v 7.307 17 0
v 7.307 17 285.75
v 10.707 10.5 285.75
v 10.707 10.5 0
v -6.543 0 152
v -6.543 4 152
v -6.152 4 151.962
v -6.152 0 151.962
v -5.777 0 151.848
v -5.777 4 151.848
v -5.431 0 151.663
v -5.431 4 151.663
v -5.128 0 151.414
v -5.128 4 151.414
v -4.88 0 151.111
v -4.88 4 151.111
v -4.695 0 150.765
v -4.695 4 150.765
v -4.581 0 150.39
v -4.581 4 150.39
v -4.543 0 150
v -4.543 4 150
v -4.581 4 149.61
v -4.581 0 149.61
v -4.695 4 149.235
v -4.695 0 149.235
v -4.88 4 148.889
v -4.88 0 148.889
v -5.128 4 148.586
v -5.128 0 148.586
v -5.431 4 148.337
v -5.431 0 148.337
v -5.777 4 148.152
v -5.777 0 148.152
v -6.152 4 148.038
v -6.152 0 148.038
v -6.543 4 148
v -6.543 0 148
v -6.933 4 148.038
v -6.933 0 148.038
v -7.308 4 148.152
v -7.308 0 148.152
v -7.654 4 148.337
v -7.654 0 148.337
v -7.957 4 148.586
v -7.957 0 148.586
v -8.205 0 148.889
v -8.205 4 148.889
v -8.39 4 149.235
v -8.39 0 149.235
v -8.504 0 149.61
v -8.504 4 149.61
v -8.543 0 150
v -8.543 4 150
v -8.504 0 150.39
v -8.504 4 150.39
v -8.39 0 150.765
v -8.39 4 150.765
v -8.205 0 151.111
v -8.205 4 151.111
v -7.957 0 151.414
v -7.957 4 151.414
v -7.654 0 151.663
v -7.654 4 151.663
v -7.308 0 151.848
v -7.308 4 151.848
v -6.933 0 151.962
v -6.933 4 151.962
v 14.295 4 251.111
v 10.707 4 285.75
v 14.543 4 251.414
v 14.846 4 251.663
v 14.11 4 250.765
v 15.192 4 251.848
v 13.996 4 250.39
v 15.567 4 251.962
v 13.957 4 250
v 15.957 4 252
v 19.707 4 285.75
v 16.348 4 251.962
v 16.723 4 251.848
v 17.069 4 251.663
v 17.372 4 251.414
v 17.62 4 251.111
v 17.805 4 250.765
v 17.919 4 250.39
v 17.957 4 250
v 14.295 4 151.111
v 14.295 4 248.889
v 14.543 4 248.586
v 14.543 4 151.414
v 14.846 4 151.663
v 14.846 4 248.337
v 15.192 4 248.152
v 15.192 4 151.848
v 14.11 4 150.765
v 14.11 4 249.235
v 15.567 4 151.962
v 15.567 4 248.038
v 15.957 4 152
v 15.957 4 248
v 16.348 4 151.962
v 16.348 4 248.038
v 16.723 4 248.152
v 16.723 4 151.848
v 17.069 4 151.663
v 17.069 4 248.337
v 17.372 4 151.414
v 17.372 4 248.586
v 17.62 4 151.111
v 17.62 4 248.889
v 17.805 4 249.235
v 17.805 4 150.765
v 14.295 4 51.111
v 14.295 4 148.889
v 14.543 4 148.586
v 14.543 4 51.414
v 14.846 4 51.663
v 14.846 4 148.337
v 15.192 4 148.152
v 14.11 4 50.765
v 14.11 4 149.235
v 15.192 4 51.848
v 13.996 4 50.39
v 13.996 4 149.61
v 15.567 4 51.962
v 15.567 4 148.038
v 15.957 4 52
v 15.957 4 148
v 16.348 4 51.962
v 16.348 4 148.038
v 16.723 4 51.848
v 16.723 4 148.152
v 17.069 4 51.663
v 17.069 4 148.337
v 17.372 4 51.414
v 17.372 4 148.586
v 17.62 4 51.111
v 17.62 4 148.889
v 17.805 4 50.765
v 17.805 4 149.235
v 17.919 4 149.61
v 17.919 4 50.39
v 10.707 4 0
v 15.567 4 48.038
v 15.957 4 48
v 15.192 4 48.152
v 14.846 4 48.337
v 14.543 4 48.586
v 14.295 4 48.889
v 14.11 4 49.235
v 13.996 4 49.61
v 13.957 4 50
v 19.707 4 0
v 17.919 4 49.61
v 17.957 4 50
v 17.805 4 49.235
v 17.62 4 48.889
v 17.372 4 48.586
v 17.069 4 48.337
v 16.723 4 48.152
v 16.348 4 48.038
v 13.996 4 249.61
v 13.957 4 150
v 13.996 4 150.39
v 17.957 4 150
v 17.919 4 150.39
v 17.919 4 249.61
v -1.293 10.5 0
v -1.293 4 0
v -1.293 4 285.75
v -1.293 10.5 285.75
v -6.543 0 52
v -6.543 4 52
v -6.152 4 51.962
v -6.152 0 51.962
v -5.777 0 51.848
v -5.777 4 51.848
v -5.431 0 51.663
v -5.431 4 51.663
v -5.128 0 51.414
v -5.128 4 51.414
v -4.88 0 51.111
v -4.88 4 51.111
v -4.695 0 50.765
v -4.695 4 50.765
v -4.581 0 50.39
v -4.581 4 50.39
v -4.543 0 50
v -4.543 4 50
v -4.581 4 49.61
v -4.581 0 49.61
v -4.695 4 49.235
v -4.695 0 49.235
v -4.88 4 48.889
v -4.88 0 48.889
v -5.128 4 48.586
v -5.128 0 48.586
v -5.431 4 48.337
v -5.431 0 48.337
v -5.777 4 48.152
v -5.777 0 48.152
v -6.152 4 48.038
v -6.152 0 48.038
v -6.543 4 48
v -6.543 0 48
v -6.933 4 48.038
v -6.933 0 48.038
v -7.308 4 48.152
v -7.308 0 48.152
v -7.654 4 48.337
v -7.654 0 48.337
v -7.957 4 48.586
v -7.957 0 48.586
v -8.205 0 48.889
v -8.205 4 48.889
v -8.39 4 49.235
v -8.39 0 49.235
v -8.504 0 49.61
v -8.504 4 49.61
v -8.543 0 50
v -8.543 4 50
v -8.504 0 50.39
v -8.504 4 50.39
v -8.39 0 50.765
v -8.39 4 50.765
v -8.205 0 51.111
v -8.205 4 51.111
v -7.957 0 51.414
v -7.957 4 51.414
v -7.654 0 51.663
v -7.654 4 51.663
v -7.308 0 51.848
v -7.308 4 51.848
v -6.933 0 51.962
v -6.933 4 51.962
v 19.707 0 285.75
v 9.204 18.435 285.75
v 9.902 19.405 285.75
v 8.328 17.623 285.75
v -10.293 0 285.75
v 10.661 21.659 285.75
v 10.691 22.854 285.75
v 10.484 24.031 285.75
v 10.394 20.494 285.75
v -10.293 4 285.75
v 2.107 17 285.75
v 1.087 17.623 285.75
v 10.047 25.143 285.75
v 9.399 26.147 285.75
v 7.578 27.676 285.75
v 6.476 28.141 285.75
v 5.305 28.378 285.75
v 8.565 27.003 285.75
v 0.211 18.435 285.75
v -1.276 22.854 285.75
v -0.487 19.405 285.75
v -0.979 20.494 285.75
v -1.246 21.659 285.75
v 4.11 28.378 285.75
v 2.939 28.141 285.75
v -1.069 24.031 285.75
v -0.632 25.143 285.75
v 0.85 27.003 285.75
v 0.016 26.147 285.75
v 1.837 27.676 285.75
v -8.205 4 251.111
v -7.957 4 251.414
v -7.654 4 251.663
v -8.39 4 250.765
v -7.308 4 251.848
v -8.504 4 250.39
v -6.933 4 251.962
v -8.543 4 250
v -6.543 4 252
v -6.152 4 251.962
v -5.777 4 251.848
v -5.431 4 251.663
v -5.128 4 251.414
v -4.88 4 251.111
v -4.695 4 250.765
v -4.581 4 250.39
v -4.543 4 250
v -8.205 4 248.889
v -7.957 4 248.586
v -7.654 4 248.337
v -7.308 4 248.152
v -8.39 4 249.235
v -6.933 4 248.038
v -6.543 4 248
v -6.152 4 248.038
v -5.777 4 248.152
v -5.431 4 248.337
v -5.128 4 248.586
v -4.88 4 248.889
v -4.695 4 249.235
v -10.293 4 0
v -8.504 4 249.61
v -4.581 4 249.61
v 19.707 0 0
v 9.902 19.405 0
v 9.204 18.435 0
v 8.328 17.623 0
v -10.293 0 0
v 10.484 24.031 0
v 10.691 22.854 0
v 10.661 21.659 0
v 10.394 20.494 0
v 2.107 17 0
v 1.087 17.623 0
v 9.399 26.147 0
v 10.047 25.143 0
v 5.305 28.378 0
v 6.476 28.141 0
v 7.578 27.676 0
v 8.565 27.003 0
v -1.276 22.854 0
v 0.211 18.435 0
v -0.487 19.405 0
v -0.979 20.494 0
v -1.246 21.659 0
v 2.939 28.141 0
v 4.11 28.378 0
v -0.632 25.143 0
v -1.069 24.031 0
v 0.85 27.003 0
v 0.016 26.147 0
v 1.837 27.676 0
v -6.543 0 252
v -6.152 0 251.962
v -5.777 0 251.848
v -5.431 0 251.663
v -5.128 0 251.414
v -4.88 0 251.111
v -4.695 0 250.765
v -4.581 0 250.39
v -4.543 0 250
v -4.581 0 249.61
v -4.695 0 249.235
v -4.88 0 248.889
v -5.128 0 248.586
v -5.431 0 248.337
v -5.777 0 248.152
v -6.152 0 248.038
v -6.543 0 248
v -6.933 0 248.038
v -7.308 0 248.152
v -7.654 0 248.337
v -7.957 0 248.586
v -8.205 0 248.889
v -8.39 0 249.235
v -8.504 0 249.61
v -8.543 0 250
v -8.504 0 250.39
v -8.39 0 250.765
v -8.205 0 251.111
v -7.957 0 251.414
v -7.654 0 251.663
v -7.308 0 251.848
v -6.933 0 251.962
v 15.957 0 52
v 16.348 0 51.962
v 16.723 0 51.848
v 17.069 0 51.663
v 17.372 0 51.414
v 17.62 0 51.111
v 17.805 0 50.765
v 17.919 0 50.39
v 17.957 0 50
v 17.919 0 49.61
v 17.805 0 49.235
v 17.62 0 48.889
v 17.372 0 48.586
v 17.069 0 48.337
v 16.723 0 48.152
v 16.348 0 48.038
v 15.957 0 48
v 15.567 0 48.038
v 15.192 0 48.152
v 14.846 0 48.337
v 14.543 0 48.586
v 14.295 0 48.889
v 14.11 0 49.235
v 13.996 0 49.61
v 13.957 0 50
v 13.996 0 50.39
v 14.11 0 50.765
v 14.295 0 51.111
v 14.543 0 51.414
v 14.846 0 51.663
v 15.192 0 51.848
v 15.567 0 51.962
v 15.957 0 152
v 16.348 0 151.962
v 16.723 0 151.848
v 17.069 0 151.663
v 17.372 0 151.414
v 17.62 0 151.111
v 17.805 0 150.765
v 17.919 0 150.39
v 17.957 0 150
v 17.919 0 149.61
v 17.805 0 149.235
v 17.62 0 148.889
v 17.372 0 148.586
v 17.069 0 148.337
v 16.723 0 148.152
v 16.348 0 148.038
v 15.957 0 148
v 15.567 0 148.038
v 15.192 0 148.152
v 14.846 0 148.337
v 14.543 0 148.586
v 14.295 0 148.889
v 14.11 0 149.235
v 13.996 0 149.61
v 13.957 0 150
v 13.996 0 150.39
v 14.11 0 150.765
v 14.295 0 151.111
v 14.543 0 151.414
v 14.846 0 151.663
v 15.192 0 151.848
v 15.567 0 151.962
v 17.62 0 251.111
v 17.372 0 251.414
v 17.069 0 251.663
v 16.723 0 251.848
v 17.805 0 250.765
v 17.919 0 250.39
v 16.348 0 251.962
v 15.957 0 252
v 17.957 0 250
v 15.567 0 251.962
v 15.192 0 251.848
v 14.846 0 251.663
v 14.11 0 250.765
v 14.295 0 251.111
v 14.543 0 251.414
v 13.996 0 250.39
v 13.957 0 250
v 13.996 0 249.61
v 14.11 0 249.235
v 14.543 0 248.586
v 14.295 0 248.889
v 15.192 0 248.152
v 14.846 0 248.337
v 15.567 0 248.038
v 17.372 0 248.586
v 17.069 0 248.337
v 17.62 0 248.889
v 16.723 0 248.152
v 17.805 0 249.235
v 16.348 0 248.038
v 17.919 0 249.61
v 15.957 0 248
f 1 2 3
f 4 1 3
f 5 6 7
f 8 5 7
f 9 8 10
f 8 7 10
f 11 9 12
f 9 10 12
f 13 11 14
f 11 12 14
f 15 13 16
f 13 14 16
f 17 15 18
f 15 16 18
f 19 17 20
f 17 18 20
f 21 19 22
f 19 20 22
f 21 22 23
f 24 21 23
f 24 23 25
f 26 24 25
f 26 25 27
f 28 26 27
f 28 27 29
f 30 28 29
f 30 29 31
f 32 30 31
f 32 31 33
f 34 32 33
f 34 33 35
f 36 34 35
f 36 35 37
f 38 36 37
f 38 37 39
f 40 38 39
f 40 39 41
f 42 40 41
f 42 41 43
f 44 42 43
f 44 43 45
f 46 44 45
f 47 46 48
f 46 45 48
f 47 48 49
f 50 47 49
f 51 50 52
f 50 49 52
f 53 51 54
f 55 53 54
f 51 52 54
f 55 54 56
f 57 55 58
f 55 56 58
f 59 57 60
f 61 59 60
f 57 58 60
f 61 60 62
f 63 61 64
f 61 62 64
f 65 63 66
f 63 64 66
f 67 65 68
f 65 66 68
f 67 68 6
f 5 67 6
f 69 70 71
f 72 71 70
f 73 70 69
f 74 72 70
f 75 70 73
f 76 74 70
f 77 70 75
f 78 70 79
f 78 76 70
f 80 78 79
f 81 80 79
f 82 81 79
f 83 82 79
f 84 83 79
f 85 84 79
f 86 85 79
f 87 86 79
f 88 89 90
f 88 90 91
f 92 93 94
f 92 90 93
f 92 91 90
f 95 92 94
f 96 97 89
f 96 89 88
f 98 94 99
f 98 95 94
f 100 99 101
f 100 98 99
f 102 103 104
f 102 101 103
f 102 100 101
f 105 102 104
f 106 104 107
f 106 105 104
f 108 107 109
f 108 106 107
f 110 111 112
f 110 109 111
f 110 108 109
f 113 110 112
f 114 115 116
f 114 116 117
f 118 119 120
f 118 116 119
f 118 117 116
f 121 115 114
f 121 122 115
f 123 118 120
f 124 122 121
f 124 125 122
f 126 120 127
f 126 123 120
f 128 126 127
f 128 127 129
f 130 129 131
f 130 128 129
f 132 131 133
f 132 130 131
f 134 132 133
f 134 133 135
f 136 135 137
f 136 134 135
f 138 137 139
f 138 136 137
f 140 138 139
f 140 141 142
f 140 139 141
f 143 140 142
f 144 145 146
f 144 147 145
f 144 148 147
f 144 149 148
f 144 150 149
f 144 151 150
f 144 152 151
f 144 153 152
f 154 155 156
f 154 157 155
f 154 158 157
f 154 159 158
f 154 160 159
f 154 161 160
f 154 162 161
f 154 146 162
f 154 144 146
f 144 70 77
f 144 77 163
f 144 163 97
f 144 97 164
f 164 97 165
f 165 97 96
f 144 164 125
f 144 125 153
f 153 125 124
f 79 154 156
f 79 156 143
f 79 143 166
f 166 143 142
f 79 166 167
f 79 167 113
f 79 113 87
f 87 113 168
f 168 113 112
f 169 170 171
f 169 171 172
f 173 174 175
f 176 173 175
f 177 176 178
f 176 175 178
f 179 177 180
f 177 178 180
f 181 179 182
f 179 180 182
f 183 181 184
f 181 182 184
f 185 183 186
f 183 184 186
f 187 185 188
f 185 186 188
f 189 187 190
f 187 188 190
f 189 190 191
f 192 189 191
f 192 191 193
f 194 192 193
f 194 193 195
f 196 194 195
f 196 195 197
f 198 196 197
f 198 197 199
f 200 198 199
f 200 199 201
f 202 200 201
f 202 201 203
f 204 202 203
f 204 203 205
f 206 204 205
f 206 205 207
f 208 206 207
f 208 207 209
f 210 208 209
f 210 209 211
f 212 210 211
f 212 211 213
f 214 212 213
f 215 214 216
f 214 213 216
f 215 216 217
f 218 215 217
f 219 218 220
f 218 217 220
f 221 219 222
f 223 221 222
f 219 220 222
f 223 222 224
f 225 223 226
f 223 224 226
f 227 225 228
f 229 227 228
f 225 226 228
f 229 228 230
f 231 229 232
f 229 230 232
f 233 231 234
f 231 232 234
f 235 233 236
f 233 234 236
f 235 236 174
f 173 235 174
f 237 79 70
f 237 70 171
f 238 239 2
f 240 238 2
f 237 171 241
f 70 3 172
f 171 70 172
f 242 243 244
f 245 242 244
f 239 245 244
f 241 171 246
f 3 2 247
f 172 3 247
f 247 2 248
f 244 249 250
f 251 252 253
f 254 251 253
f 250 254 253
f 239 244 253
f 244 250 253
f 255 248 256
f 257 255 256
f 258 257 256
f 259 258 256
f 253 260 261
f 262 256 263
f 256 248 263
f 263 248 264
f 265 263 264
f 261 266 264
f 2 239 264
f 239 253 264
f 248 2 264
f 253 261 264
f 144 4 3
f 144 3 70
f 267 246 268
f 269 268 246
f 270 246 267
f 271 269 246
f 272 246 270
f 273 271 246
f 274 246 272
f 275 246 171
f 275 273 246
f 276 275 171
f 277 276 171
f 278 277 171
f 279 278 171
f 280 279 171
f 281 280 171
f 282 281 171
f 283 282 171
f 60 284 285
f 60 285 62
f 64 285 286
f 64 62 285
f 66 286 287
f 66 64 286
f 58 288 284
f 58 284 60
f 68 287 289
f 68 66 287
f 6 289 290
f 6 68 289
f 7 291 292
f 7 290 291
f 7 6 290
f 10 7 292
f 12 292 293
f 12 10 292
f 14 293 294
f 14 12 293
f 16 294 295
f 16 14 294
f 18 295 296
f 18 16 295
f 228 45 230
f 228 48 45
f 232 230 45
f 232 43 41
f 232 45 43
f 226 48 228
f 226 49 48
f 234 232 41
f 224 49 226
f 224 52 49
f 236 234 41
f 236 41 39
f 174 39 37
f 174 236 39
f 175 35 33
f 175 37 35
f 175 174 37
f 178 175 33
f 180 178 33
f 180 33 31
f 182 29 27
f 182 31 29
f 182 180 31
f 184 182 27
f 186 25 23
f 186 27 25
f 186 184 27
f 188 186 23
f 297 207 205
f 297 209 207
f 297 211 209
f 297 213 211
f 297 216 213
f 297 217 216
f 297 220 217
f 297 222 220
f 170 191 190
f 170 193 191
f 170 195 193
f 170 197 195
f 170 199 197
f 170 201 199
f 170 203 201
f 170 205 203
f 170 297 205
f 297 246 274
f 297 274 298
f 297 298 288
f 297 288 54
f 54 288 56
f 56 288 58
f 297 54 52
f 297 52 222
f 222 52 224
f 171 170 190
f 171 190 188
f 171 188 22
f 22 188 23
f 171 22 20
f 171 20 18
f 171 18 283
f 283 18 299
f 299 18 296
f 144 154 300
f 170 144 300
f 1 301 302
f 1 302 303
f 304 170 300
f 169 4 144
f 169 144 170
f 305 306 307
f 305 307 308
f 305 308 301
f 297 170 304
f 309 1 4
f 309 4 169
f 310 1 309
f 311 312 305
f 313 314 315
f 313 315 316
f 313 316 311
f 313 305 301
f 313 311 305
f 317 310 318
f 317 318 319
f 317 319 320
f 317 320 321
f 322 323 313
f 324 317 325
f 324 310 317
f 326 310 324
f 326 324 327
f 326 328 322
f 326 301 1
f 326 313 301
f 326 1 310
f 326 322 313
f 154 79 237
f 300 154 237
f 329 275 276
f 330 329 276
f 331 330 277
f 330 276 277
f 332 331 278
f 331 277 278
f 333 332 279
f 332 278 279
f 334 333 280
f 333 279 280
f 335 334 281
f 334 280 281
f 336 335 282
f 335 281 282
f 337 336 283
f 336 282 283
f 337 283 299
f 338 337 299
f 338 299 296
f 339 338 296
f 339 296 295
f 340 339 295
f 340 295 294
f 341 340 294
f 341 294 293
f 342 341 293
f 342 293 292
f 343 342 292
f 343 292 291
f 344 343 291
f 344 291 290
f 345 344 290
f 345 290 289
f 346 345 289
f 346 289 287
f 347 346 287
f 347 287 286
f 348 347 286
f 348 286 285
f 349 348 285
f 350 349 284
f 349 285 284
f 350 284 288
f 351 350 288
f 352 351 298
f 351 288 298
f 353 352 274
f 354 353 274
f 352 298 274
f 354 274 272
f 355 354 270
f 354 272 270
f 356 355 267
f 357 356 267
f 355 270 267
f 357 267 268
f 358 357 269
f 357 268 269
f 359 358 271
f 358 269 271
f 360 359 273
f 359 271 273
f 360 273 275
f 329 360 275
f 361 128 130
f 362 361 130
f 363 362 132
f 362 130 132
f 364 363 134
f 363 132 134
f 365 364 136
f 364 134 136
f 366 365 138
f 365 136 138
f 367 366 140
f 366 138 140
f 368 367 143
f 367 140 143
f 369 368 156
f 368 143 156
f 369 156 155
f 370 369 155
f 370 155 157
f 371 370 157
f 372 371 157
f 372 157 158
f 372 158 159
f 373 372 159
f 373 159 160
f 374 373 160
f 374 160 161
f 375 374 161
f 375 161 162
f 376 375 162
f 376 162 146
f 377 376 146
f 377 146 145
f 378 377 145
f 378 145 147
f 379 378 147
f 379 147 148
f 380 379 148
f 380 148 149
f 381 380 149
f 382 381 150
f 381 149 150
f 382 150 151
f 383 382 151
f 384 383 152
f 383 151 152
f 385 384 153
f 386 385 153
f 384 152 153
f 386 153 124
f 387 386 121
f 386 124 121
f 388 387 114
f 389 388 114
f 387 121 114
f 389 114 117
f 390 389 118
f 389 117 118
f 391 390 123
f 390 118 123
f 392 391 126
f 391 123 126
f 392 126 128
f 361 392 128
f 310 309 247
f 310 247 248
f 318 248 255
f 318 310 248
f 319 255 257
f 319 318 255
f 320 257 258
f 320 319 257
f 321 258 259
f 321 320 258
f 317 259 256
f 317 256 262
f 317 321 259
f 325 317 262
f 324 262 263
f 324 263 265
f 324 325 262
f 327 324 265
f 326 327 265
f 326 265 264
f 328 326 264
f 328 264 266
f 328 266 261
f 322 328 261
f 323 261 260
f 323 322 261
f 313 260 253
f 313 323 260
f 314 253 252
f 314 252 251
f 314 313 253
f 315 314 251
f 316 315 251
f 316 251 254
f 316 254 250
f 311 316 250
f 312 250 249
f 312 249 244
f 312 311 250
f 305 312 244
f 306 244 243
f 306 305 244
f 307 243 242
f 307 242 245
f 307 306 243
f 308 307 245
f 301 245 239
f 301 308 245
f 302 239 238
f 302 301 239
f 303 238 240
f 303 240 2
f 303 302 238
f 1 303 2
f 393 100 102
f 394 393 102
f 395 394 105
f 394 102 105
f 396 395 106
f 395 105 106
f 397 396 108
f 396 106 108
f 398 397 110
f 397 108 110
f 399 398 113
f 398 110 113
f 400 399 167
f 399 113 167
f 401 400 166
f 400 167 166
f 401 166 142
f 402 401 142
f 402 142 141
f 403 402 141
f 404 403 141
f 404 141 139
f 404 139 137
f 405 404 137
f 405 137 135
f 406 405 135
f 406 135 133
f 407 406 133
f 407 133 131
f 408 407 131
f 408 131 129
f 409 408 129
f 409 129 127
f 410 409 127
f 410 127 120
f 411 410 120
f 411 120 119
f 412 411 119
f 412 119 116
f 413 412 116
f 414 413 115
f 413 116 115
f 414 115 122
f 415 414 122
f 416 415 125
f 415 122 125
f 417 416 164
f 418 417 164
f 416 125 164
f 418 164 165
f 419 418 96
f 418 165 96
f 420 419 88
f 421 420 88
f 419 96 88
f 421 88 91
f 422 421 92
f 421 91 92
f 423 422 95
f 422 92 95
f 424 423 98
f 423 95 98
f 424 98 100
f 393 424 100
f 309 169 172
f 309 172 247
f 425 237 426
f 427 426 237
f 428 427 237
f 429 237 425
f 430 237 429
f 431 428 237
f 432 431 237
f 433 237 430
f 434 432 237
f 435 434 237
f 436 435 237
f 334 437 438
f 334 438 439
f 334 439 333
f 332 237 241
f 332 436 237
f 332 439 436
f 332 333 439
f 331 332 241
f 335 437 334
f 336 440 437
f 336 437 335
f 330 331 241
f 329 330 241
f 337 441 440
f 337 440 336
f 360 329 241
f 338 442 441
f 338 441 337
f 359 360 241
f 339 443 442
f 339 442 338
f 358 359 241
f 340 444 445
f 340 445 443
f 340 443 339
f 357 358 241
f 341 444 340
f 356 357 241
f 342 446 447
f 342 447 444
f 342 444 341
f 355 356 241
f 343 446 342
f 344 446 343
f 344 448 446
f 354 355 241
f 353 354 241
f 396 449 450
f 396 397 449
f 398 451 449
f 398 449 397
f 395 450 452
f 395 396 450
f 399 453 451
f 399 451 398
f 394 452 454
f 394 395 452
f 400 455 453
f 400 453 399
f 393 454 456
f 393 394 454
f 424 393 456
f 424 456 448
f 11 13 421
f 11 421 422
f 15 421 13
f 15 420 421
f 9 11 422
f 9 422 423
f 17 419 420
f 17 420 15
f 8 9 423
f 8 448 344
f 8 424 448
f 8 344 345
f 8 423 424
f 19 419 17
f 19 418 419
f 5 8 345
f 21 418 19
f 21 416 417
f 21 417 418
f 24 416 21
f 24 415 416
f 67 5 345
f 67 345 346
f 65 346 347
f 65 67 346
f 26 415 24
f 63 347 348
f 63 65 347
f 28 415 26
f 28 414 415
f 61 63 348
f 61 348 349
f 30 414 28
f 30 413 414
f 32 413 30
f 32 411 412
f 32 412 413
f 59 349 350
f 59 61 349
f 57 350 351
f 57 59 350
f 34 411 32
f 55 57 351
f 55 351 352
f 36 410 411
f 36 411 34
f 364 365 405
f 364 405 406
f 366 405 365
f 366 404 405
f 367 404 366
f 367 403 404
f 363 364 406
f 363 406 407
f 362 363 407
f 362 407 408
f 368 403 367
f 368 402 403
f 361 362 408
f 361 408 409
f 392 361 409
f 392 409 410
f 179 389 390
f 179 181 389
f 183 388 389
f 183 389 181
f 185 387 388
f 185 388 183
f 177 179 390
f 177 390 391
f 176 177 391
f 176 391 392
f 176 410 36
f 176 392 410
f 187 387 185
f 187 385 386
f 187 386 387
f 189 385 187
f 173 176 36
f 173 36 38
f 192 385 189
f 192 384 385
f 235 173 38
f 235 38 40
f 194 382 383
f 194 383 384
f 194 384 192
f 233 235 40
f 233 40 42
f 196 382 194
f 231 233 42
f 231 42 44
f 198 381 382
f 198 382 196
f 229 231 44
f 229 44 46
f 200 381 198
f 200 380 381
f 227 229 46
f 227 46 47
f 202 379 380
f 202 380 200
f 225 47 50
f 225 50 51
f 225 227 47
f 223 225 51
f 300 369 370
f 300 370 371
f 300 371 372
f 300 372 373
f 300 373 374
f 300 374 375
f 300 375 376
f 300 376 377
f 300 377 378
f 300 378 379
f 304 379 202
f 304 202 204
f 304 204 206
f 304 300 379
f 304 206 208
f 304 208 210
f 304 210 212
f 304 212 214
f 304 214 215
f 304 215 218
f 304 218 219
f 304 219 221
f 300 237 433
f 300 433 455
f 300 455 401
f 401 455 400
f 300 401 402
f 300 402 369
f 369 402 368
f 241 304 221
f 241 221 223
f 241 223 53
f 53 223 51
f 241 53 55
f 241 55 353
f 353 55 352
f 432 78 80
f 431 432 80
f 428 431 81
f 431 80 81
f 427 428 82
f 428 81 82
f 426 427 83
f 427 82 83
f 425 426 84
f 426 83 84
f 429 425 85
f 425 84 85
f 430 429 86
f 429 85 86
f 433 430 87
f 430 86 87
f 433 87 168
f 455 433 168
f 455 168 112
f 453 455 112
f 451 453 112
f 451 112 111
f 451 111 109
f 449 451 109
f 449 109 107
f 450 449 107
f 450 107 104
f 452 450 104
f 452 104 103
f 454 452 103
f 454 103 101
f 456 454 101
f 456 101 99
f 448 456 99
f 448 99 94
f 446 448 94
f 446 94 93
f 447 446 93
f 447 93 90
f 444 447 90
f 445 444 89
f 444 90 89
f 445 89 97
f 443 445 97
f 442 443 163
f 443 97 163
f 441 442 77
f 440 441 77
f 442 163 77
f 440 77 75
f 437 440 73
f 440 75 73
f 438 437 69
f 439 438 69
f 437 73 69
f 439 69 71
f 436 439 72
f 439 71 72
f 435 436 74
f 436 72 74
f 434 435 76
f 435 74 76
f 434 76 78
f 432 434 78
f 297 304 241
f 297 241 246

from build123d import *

# Parameters (mm, degrees)
BOSS_EXTRUDE1_DEPTH = 285.75
CUT_EXTRUDE1_REACH  = 289.467
SKETCH2_R           = 2


with BuildPart() as part:
    # Sketch1 → Boss-Extrude1 (new body)
    with BuildSketch(Plane.XY):
        with BuildLine():
            Line((19.707457755, 0), (-10.292542245, 0))
            Line((-10.292542245, 0), (-10.292542245, 4))
            Line((-10.292542245, 4), (-1.292542245, 4))
            Line((-1.292542245, 4), (-1.292542245, 10.5))
            Line((-1.292542245, 10.5), (2.107457755, 17))
            ThreePointArc((2.107457755, 17), (4.707457755, 28.407402334), (7.307457755, 17))
            Line((7.307457755, 17), (10.707457755, 10.5))
            Line((10.707457755, 10.5), (10.707457755, 4))
            Line((10.707457755, 4), (19.707457755, 4))
            Line((19.707457755, 4), (19.707457755, 0))
        make_face()
    extrude(amount=BOSS_EXTRUDE1_DEPTH)

    # Sketch2 → Cut-Extrude1 (cut, up to next)
    with BuildSketch(Plane(origin=(0, 4, 0), x_dir=(1, 0, 0), z_dir=(0, 1, 0)), mode=Mode.PRIVATE) as cut_extrude1_sk1:
        with Locations(Location((-6.542542245, -50, 0), (0, 0, 270))):
            Circle(SKETCH2_R)
    cut_extrude1_tool1 = extrude(cut_extrude1_sk1.sketch, amount=-CUT_EXTRUDE1_REACH, mode=Mode.PRIVATE) & part.part
    # Sketch2 → Cut-Extrude1 (cut, up to next)
    with BuildSketch(Plane(origin=(0, 4, 0), x_dir=(1, 0, 0), z_dir=(0, 1, 0)), mode=Mode.PRIVATE) as cut_extrude1_sk2:
        with Locations(Location((15.957457755, -50, 0), (0, 0, 270))):
            Circle(SKETCH2_R)
    cut_extrude1_tool2 = extrude(cut_extrude1_sk2.sketch, amount=-CUT_EXTRUDE1_REACH, mode=Mode.PRIVATE) & part.part
    # Sketch2 → Cut-Extrude1 (cut, up to next)
    with BuildSketch(Plane(origin=(0, 4, 0), x_dir=(1, 0, 0), z_dir=(0, 1, 0)), mode=Mode.PRIVATE) as cut_extrude1_sk3:
        with Locations(Location((15.957457755, -150, 0), (0, 0, 270))):
            Circle(SKETCH2_R)
    cut_extrude1_tool3 = extrude(cut_extrude1_sk3.sketch, amount=-CUT_EXTRUDE1_REACH, mode=Mode.PRIVATE) & part.part
    # Sketch2 → Cut-Extrude1 (cut, up to next)
    with BuildSketch(Plane(origin=(0, 4, 0), x_dir=(1, 0, 0), z_dir=(0, 1, 0)), mode=Mode.PRIVATE) as cut_extrude1_sk4:
        with Locations(Location((-6.542542245, -150, 0), (0, 0, 270))):
            Circle(SKETCH2_R)
    cut_extrude1_tool4 = extrude(cut_extrude1_sk4.sketch, amount=-CUT_EXTRUDE1_REACH, mode=Mode.PRIVATE) & part.part
    # Sketch2 → Cut-Extrude1 (cut, up to next)
    with BuildSketch(Plane(origin=(0, 4, 0), x_dir=(1, 0, 0), z_dir=(0, 1, 0)), mode=Mode.PRIVATE) as cut_extrude1_sk5:
        with Locations(Location((15.957457755, -250, 0), (0, 0, 270))):
            Circle(SKETCH2_R)
    cut_extrude1_tool5 = extrude(cut_extrude1_sk5.sketch, amount=-CUT_EXTRUDE1_REACH, mode=Mode.PRIVATE) & part.part
    # Sketch2 → Cut-Extrude1 (cut, up to next)
    with BuildSketch(Plane(origin=(0, 4, 0), x_dir=(1, 0, 0), z_dir=(0, 1, 0)), mode=Mode.PRIVATE) as cut_extrude1_sk6:
        with Locations(Location((-6.542542245, -250, 0), (0, 0, 270))):
            Circle(SKETCH2_R)
    cut_extrude1_tool6 = extrude(cut_extrude1_sk6.sketch, amount=-CUT_EXTRUDE1_REACH, mode=Mode.PRIVATE) & part.part
    add(cut_extrude1_tool1.solids().sort_by_distance((-6.542542, 4, 50))[0], mode=Mode.SUBTRACT)
    add(cut_extrude1_tool2.solids().sort_by_distance((15.957458, 4, 50))[0], mode=Mode.SUBTRACT)
    add(cut_extrude1_tool3.solids().sort_by_distance((15.957458, 4, 150))[0], mode=Mode.SUBTRACT)
    add(cut_extrude1_tool4.solids().sort_by_distance((-6.542542, 4, 150))[0], mode=Mode.SUBTRACT)
    add(cut_extrude1_tool5.solids().sort_by_distance((15.957458, 4, 250))[0], mode=Mode.SUBTRACT)
    add(cut_extrude1_tool6.solids().sort_by_distance((-6.542542, 4, 250))[0], mode=Mode.SUBTRACT)


solid = part.part
